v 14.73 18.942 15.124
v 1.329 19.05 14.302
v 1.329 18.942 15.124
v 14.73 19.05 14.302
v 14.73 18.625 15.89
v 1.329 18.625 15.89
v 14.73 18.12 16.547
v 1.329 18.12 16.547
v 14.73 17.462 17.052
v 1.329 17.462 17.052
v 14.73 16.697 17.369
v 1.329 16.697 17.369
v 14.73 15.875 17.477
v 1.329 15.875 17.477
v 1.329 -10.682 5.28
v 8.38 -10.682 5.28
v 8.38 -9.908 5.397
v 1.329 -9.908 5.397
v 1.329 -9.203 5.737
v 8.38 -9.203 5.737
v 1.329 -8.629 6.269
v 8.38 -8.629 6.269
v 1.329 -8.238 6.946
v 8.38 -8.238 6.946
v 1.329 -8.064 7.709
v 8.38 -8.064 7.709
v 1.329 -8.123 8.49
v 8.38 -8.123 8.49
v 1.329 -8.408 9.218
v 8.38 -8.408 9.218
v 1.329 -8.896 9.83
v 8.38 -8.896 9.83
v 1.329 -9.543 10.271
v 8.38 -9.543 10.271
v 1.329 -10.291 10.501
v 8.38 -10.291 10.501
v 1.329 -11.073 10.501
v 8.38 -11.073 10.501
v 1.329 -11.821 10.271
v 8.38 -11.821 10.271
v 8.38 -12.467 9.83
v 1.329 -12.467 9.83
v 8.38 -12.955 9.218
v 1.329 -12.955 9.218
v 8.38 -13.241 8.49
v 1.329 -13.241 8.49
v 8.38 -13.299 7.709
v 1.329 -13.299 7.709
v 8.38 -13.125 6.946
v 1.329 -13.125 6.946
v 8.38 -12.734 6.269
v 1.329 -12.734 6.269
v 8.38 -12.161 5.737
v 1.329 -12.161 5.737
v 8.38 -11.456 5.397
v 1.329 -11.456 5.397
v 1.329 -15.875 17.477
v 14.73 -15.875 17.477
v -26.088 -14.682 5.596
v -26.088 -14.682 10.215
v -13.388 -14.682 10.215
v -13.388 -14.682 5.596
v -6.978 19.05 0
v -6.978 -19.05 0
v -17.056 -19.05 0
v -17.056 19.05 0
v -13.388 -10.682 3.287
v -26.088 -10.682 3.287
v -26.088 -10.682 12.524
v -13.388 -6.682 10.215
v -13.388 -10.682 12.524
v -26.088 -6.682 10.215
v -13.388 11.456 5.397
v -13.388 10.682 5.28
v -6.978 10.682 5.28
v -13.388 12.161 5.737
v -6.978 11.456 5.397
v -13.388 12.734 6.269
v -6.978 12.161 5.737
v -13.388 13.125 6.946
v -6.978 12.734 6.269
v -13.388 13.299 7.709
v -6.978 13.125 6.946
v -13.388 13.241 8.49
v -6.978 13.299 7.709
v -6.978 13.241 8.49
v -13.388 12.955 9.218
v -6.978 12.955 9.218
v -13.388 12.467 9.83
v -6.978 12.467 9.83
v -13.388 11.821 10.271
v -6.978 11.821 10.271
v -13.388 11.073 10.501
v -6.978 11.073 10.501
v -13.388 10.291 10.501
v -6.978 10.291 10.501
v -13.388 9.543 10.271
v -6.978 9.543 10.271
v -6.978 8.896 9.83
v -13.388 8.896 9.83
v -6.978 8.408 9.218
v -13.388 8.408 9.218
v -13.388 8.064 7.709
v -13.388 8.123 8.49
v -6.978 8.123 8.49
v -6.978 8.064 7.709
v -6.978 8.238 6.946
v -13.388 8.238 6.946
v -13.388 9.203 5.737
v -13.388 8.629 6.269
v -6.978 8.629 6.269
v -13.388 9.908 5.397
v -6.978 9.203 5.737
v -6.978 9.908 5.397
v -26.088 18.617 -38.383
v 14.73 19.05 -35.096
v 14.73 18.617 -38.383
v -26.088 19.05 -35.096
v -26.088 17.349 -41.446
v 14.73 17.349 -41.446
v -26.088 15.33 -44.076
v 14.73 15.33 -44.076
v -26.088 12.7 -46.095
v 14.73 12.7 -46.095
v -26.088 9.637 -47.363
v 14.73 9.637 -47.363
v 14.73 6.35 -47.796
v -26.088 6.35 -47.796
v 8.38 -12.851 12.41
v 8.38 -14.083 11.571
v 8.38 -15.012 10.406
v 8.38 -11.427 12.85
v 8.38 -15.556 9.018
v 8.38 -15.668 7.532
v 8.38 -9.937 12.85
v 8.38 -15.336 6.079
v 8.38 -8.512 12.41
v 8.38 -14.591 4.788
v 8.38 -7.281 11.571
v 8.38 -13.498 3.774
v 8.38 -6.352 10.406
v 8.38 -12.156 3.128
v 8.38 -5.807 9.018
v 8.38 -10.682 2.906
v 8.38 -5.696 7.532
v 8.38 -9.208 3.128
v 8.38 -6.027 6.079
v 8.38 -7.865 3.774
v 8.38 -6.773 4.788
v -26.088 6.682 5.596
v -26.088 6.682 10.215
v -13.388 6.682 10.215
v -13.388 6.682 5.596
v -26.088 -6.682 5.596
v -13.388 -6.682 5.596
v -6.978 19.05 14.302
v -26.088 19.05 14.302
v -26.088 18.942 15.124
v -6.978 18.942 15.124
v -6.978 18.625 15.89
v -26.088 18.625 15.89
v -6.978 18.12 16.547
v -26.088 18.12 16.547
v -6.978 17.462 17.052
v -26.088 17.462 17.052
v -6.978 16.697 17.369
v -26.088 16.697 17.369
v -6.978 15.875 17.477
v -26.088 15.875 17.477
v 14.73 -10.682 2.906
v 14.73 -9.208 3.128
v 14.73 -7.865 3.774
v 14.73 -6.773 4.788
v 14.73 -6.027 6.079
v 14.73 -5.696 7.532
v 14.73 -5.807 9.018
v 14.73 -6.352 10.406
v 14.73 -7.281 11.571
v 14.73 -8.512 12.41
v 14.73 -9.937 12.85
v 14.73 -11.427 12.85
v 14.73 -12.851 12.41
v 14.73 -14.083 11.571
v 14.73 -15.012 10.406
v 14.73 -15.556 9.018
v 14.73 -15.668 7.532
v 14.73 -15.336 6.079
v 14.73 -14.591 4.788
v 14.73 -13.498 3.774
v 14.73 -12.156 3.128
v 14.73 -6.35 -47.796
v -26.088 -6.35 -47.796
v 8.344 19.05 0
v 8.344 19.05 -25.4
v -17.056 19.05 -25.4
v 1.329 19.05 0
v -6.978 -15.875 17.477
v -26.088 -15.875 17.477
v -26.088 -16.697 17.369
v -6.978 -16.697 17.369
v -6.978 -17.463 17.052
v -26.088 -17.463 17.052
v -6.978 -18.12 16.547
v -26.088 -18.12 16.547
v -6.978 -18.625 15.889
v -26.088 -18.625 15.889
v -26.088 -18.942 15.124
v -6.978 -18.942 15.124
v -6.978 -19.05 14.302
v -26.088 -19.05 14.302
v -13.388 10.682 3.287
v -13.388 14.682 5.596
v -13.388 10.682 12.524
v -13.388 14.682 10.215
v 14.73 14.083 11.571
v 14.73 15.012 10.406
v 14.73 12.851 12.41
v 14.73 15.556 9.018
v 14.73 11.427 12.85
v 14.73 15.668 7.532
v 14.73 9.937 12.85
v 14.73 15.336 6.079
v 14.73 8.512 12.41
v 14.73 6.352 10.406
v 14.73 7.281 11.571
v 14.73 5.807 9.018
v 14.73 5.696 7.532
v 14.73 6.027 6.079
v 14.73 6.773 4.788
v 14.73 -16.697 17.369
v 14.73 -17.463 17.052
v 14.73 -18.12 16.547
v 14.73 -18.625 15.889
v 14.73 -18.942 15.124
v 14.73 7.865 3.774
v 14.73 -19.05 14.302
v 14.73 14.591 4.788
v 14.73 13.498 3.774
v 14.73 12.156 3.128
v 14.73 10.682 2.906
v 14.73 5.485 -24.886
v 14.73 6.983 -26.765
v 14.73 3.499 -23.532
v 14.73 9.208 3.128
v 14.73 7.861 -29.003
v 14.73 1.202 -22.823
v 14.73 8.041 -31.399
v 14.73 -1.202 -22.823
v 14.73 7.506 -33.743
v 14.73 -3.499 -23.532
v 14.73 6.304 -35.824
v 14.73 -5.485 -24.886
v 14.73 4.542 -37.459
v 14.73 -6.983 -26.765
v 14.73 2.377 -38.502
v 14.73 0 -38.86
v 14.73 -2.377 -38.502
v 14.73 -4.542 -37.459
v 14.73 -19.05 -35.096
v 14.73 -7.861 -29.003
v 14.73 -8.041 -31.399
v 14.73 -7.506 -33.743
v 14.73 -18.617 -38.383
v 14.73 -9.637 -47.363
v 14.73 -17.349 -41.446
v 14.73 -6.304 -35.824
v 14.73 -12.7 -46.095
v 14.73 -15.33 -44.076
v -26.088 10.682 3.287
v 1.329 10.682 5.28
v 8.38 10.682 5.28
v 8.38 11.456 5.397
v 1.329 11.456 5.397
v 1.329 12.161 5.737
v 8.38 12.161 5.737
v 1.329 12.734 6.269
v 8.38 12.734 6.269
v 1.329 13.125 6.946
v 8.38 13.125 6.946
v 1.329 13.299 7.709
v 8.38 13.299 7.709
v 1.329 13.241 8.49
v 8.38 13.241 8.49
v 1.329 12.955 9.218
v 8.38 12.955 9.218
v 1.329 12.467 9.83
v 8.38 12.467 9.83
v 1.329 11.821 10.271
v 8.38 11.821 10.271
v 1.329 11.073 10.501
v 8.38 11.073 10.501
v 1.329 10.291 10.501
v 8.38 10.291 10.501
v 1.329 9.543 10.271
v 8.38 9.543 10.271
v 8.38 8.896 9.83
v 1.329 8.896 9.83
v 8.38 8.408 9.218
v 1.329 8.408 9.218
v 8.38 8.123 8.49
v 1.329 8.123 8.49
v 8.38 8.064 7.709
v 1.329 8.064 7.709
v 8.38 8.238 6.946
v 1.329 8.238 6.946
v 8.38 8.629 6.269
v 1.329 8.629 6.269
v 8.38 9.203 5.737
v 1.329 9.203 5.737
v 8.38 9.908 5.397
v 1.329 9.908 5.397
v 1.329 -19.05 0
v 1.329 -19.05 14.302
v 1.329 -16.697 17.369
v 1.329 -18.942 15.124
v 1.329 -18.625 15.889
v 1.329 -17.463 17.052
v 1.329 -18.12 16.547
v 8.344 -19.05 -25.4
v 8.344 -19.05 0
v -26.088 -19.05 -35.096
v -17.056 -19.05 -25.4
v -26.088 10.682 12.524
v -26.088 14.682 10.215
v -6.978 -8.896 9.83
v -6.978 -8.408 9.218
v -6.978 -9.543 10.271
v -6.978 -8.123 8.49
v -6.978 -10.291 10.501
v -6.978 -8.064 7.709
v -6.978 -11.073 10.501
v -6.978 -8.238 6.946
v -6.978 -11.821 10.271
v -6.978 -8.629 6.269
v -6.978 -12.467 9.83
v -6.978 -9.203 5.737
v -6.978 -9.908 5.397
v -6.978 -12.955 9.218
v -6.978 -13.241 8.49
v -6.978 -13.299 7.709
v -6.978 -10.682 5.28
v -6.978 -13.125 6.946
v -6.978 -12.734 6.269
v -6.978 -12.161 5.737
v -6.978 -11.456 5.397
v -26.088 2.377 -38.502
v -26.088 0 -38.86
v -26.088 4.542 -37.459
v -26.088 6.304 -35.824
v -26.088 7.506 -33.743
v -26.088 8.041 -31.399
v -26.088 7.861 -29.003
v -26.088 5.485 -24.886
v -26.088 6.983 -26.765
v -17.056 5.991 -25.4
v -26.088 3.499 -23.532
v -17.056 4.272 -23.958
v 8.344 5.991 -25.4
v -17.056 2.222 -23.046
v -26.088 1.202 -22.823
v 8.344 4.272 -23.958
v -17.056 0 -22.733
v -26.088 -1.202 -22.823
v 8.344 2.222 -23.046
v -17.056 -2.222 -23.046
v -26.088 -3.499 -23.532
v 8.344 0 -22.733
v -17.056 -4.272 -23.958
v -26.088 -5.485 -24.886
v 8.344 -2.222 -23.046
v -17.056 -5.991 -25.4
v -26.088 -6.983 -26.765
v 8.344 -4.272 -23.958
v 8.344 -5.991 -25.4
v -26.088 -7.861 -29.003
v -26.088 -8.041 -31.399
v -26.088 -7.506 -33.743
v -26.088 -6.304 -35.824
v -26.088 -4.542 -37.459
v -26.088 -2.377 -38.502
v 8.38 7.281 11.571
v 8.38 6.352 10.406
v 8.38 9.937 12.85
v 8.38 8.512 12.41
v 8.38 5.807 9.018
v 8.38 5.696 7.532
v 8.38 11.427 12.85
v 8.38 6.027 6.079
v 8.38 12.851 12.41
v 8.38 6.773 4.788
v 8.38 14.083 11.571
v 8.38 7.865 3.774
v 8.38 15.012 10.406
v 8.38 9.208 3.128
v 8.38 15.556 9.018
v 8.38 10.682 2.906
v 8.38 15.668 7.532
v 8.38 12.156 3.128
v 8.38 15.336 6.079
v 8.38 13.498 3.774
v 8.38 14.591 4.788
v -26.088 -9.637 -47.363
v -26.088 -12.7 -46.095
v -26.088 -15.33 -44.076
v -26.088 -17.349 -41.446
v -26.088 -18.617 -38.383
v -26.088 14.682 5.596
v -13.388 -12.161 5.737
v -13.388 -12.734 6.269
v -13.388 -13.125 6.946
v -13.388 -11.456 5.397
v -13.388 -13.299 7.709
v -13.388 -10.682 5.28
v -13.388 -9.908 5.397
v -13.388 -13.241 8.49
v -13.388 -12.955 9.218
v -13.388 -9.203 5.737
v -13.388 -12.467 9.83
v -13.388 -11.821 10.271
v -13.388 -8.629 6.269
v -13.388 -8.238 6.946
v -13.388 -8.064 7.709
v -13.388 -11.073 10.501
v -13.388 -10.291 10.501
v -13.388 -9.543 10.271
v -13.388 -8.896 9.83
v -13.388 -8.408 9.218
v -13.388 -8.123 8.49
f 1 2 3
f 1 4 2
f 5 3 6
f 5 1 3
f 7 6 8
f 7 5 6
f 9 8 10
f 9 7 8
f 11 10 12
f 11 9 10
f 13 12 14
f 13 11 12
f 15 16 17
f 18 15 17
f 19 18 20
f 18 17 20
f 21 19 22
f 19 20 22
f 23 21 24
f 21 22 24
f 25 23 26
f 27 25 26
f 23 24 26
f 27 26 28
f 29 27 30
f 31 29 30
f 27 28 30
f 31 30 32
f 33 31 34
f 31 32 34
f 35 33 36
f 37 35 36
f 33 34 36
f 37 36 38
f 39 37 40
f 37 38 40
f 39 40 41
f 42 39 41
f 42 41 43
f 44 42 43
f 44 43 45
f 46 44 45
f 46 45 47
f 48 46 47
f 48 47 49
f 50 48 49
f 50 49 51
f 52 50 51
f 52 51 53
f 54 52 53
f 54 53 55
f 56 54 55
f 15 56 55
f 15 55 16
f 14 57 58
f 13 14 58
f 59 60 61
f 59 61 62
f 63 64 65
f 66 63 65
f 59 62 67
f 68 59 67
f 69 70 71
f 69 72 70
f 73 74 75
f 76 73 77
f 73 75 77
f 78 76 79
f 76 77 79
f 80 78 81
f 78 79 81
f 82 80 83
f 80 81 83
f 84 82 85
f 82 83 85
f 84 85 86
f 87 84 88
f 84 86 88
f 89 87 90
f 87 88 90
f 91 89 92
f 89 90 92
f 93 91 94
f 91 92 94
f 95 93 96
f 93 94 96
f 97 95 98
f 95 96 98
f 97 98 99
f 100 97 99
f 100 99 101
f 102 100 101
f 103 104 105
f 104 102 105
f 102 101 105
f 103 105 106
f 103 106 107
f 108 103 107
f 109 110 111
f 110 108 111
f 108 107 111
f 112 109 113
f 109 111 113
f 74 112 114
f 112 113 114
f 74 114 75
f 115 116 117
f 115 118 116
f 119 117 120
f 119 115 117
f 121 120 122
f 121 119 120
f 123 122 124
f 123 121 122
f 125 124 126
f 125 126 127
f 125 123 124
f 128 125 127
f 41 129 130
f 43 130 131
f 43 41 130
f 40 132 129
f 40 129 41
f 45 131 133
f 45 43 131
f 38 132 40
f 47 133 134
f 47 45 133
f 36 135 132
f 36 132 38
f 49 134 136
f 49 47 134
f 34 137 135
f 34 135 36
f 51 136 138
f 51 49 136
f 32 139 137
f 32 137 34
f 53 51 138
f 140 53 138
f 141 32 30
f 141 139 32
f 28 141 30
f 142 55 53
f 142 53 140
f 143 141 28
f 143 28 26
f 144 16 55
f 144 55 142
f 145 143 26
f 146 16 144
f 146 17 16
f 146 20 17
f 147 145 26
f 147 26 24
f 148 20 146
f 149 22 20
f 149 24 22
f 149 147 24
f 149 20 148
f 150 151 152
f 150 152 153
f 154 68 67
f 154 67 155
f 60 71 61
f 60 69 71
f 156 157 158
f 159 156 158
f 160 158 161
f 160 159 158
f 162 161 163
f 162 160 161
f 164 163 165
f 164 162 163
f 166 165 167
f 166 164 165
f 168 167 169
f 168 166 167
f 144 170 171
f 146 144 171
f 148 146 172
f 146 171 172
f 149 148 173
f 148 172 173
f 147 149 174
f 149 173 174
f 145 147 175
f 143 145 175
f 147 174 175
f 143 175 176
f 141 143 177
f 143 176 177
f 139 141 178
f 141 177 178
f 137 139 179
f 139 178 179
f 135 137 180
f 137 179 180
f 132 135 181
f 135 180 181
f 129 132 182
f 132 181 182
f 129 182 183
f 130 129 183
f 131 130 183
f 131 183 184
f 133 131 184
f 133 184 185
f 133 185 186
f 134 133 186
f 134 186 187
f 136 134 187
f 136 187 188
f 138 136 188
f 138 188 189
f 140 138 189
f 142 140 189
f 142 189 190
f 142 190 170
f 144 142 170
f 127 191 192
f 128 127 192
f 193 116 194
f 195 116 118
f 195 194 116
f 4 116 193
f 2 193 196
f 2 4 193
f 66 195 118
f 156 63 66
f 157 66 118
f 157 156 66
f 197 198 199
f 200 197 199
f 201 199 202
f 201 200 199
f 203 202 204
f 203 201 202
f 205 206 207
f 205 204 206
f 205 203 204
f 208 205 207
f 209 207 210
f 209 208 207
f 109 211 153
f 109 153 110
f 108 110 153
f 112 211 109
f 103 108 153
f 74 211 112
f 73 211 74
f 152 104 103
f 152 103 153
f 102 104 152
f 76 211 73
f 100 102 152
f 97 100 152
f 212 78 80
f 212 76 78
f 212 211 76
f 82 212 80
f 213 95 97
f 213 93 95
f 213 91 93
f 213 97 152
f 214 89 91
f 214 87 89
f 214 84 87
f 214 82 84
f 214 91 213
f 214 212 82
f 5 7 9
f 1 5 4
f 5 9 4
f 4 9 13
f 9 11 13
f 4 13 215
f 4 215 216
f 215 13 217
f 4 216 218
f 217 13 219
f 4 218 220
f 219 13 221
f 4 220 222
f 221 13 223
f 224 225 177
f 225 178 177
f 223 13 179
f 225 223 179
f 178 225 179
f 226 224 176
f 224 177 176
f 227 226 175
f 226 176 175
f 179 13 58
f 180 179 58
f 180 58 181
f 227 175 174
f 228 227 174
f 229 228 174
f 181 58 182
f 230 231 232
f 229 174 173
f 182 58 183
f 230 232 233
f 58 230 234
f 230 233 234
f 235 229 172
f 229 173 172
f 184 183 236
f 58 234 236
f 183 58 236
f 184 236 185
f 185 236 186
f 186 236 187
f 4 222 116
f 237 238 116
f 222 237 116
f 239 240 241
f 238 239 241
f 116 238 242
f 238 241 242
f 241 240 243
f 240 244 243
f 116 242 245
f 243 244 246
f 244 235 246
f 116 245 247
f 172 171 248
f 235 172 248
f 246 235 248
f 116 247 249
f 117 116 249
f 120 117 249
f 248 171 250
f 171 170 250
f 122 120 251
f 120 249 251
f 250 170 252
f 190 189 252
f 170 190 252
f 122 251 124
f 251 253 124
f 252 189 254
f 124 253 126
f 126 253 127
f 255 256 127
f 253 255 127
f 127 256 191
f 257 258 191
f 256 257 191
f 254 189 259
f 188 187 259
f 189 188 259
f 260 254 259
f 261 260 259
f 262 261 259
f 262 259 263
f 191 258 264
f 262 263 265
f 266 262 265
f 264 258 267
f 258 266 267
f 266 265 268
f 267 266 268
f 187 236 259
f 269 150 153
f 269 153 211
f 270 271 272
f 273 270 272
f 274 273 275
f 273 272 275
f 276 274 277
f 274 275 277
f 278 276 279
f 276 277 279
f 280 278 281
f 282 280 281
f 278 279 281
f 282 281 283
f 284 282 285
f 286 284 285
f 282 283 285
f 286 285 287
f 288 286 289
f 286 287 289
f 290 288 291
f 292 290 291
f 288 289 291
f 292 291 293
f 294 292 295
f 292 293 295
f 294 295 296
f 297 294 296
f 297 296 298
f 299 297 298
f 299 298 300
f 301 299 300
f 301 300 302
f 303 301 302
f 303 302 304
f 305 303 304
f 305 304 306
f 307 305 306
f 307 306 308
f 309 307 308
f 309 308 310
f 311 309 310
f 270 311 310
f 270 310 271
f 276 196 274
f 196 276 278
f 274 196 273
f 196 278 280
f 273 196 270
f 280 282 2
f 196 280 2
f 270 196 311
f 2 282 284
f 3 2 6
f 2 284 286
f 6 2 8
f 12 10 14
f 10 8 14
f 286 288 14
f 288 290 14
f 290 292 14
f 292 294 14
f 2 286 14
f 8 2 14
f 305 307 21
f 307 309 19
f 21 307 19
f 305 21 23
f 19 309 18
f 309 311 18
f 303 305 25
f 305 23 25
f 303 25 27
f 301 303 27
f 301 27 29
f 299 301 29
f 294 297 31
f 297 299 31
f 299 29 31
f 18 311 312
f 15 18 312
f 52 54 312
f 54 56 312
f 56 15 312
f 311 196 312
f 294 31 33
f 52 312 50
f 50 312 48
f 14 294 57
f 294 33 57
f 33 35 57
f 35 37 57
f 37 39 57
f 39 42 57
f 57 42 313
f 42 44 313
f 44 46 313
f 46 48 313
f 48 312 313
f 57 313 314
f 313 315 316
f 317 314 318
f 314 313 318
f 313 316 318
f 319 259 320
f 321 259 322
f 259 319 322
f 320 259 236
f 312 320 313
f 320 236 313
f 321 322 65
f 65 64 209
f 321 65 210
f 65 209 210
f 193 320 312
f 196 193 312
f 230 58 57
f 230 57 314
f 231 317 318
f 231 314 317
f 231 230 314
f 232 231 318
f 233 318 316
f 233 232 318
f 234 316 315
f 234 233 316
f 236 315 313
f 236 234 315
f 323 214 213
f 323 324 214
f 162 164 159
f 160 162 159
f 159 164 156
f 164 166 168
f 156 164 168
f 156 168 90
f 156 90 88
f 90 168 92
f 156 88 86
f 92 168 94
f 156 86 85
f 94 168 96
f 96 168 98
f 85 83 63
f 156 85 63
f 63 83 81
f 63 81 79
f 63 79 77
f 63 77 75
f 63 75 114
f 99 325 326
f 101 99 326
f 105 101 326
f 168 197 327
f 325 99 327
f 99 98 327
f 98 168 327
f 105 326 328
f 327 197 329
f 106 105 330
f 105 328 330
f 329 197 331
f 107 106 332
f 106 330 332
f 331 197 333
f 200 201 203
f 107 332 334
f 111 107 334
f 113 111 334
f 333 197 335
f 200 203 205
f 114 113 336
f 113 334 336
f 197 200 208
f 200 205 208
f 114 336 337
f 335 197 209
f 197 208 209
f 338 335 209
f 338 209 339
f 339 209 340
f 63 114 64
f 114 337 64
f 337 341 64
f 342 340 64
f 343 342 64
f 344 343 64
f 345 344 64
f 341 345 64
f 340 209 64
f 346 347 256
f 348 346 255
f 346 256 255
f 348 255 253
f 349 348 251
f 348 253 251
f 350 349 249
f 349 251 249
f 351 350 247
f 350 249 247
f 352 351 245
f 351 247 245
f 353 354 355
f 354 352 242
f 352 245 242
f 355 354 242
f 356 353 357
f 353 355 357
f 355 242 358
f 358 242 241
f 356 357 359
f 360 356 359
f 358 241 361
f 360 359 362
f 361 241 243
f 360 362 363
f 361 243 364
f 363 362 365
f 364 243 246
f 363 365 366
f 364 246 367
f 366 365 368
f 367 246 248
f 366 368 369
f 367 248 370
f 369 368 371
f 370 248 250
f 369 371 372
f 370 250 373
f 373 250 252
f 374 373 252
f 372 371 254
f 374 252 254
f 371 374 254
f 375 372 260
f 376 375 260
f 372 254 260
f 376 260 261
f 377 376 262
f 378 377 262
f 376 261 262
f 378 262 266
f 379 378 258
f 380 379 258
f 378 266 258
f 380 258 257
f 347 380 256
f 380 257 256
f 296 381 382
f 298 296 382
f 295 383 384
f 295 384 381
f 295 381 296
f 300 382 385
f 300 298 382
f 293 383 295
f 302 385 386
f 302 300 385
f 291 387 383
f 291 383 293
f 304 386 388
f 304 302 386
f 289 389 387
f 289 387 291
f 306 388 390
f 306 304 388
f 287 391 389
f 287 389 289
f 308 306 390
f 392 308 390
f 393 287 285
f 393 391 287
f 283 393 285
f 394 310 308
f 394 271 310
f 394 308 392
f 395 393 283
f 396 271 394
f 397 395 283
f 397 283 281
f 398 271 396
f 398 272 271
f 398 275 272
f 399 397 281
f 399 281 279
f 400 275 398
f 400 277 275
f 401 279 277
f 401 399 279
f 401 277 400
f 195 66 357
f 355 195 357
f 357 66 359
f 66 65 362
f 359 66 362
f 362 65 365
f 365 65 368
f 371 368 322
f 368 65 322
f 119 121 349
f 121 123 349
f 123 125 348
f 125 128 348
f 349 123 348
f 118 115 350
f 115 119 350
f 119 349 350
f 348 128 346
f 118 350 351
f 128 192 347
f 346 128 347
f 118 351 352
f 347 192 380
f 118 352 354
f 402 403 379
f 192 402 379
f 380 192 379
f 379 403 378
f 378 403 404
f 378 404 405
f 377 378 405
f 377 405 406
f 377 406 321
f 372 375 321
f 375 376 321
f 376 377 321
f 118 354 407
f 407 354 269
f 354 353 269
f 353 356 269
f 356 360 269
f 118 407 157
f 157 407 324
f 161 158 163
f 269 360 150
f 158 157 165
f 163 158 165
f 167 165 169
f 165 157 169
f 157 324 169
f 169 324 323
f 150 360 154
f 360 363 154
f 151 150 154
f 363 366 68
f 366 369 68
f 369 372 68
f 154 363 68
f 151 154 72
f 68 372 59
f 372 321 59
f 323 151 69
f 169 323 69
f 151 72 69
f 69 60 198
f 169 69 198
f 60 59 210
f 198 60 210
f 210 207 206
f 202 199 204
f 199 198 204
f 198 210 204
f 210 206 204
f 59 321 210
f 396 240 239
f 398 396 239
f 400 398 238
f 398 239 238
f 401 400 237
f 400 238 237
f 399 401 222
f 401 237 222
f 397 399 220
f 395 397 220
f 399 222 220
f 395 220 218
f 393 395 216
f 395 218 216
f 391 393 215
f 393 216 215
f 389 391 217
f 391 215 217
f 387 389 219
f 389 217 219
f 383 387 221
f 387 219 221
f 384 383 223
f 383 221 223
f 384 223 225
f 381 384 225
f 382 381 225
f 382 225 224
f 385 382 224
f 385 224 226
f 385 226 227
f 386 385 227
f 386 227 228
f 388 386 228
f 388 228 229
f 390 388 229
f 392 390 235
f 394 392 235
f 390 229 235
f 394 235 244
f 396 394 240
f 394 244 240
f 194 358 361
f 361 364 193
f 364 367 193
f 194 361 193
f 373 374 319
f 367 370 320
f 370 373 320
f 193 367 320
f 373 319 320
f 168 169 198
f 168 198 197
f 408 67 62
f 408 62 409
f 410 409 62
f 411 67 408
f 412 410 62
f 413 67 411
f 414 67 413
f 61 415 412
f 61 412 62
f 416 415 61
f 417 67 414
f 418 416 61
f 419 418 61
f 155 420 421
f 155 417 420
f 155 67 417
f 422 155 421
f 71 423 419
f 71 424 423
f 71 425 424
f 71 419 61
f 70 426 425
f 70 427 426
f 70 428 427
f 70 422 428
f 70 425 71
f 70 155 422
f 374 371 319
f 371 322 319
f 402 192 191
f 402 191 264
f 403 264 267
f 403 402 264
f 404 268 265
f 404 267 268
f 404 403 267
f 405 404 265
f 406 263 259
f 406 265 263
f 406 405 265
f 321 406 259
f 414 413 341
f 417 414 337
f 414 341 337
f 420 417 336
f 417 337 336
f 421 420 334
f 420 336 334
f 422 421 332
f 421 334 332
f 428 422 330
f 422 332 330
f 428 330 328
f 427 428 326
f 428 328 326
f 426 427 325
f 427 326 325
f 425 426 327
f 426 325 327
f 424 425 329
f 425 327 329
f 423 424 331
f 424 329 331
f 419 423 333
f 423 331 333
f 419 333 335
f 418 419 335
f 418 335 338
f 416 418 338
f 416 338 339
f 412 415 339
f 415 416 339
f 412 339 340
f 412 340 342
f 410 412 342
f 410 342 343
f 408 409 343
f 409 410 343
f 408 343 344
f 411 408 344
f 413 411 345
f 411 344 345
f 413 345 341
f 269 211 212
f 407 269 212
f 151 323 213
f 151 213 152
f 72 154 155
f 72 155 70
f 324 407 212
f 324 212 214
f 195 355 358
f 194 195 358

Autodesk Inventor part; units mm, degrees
ref_plane "YZ Plane" through (0, 0, 0) normal (1, 0, 0) x (0, 1, 0)
ref_plane "XZ Plane" through (0, 0, 0) normal (0, 1, 0) x (-1, 0, 0)
ref_plane "XY Plane" through (0, 0, 0) normal (0, 0, 1) x (1, 0, 0)
sketch "Sketch1" plane through (0, 0, 0) normal (0, 1, 0) x (-1, 0, 0)
  arc A0 (5.6966, -10.4681) -> (3.0156, -10.4681) centre (4.3561, -12.7) ccw projected
  line L0 (17.0561, -25.4) -> (-8.3439, -25.4)
  line L1 (-8.3439, -25.4) -> (-8.3439, 0)
  line L2 (17.0561, 0) -> (17.0561, -25.4)
  line L3 (17.0561, -25.4) -> (-8.3439, 0) construction
  line L4 (-8.3439, -25.4) -> (17.0561, 0) construction
  line L5 (-14.7304, 17.477) -> (-14.7304, -47.796)
  line L6 (-14.7304, -47.796) -> (26.0883, -47.796)
  line L7 (26.0883, -47.796) -> (26.0883, 17.477)
  line L8 (-1.3293, 0) -> (-1.3293, 17.477)
  line L9 (6.9778, 17.477) -> (6.9778, 0)
  line L10 (-8.3439, 0) -> (-1.3293, 0)
  line L11 (6.9778, 0) -> (17.0561, 0)
  line L12 (26.0883, 17.477) -> (6.9778, 17.477)
  line L13 (-1.3293, 17.477) -> (-14.7304, 17.477)
  point P0 (0, 0)
  dimension "d0" = 25.4
  dimension "d1" = 25.4
extrude "Extrusion1" add sketch "Sketch1" along normal mid plane 38.1
sketch "Sketch2" plane through (14.7304, -19.05, -47.796) normal (1, 0, 0) x (0, 0, -1)
  arc A0 (-22.6007, 24.7617) -> (-22.396, 13.1445) centre (-16.9992, 19.05) ccw projected
  circle A1 centre (-16.9992, 19.05) radius 8
  circle A2 centre (-16.9992, 19.05) radius 8.0635
  point P0 (-47.796, 19.05)
  dimension "d4" = 0.0635
extrude "Extrusion2" cut sketch "Sketch2" against normal through all contours A1 A0 | A2
fillet "Fillet1" radius 12.7 2 edges at (-5.6789, -19.05, -47.796) (-5.6789, 19.05, -47.796)
fillet "Fillet2" radius 3.175 4 edges at (8.0299, 19.05, 17.477) (-16.533, 19.05, 17.477) (-16.533, -19.05, 17.477) (8.0299, -19.05, 17.477)
sketch "Sketch3" plane through (14.7304, -6.35, -47.796) normal (1, 0, 0) x (0, 0, -1)
  circle A0 centre (-16.9992, 6.35) radius 8.0635 projected
  arc A1 (-65.2731, -9.525) -> (-62.0981, -12.7) centre (-62.0981, -9.525) ccw projected
  line L0 (-12.7, -12.7) -> (-62.0981, -12.7) projected
  arc A2 (-12.7, -12.7) -> (0, 0) centre (-12.7, 0) ccw projected
  line L1 (0, 0) -> (0, 12.7) projected
  arc A3 (0, 12.7) -> (-12.7, 25.4) centre (-12.7, 12.7) ccw projected
  line L2 (-62.0981, 25.4) -> (-12.7, 25.4) projected
  arc A4 (-62.0981, 25.4) -> (-65.2731, 22.225) centre (-62.0981, 22.225) ccw projected
  line L3 (-65.2731, -9.525) -> (-65.2731, 22.225) projected
  line L4 (-48.1725, 17.0318) -> (-55.7015, 17.0318) construction
  line L5 (-55.7015, 17.0318) -> (-55.7015, -4.3318) construction
  line L6 (-55.7015, -4.3318) -> (-48.1725, -4.3318) construction
  line L7 (-48.1725, -4.3318) -> (-48.1725, 17.0318) construction
  line L8 (-48.1725, 17.0318) -> (-55.7015, -4.3318) construction
  line L9 (-55.7015, 17.0318) -> (-48.1725, -4.3318) construction
  circle A5 centre (-55.7015, 17.0318) radius 2.625
  circle A6 centre (-55.7015, -4.3318) radius 2.625
  point P0 (-47.796, 6.35)
  point P1 (-51.937, 6.35)
  dimension "d9" = 5.25
  dimension "d10" = 5.25
extrude "Extrusion3" cut sketch "Sketch3" against normal through all contours A5 | A6
sketch "Sketch4" plane through (-26.0883, -6.35, -47.796) normal (-1, 0, 0) x (0, 0, 1)
  circle A0 centre (55.7015, 17.0318) radius 2.625 projected
  circle A1 centre (55.7015, -4.3318) radius 2.625 projected
  circle A2 centre (16.9992, 6.35) radius 8.0635 projected
  arc A3 (62.0981, -12.7) -> (65.2731, -9.525) centre (62.0981, -9.525) ccw projected
  line L0 (65.2731, -9.525) -> (65.2731, 22.225) projected
  arc A4 (65.2731, 22.225) -> (62.0981, 25.4) centre (62.0981, 22.225) ccw projected
  line L1 (12.7, 25.4) -> (62.0981, 25.4) projected
  arc A5 (12.7, 25.4) -> (0, 12.7) centre (12.7, 12.7) ccw projected
  line L2 (0, 0) -> (0, 12.7) projected
  arc A6 (0, 0) -> (12.7, -12.7) centre (12.7, 0) ccw projected
  line L3 (62.0981, -12.7) -> (12.7, -12.7) projected
  line L4 (60.3203, 17.0318) -> (58.0109, 13.0318)
  line L5 (58.0109, 13.0318) -> (53.3921, 13.0318)
  line L6 (53.3921, 13.0318) -> (51.0827, 17.0318)
  line L7 (51.0827, 17.0318) -> (53.3921, 21.0318)
  line L8 (53.3921, 21.0318) -> (58.0109, 21.0318)
  line L9 (58.0109, 21.0318) -> (60.3203, 17.0318)
  line L10 (60.3203, -4.3318) -> (58.0109, -8.3318)
  line L11 (58.0109, -8.3318) -> (53.3921, -8.3318)
  line L12 (53.3921, -8.3318) -> (51.0827, -4.3318)
  line L13 (51.0827, -4.3318) -> (53.3921, -0.3318)
  line L14 (53.3921, -0.3318) -> (58.0109, -0.3318)
  line L15 (58.0109, -0.3318) -> (60.3203, -4.3318)
  point P0 (47.796, 6.35)
  dimension "d13" = 8
  dimension "d14" = 8
extrude "Extrusion4" cut sketch "Sketch4" against normal blind 12.7 contours L4 L5 L6 L7 L8 L9 | L10 L11 L12 L13 L14 L15
sketch "Sketch5" plane through (14.7304, -6.35, -47.796) normal (1, 0, 0) x (0, 0, -1)
  circle A0 centre (-55.7015, 17.0318) radius 2.625 projected
  circle A1 centre (-55.7015, -4.3318) radius 2.625 projected
  circle A2 centre (-16.9992, 6.35) radius 8.0635 projected
  arc A3 (-65.2731, -9.525) -> (-62.0981, -12.7) centre (-62.0981, -9.525) ccw projected
  line L0 (-12.7, -12.7) -> (-62.0981, -12.7) projected
  arc A4 (-12.7, -12.7) -> (0, 0) centre (-12.7, 0) ccw projected
  line L1 (0, 0) -> (0, 12.7) projected
  arc A5 (0, 12.7) -> (-12.7, 25.4) centre (-12.7, 12.7) ccw projected
  line L2 (-62.0981, 25.4) -> (-12.7, 25.4) projected
  arc A6 (-62.0981, 25.4) -> (-65.2731, 22.225) centre (-62.0981, 22.225) ccw projected
  line L3 (-65.2731, -9.525) -> (-65.2731, 22.225) projected
  circle A7 centre (-55.7015, -4.3318) radius 2.625 projected
  circle A8 centre (-55.7015, -4.3318) radius 5
  circle A9 centre (-55.7015, 17.0318) radius 5
  point P0 (-47.796, 6.35)
  dimension "d17" = 10
  dimension "d18" = 10
extrude "Extrusion5" cut sketch "Sketch5" against normal blind 6.35 contours A8 | A9
properties part number "3d printed motor shaft block for base v1"
